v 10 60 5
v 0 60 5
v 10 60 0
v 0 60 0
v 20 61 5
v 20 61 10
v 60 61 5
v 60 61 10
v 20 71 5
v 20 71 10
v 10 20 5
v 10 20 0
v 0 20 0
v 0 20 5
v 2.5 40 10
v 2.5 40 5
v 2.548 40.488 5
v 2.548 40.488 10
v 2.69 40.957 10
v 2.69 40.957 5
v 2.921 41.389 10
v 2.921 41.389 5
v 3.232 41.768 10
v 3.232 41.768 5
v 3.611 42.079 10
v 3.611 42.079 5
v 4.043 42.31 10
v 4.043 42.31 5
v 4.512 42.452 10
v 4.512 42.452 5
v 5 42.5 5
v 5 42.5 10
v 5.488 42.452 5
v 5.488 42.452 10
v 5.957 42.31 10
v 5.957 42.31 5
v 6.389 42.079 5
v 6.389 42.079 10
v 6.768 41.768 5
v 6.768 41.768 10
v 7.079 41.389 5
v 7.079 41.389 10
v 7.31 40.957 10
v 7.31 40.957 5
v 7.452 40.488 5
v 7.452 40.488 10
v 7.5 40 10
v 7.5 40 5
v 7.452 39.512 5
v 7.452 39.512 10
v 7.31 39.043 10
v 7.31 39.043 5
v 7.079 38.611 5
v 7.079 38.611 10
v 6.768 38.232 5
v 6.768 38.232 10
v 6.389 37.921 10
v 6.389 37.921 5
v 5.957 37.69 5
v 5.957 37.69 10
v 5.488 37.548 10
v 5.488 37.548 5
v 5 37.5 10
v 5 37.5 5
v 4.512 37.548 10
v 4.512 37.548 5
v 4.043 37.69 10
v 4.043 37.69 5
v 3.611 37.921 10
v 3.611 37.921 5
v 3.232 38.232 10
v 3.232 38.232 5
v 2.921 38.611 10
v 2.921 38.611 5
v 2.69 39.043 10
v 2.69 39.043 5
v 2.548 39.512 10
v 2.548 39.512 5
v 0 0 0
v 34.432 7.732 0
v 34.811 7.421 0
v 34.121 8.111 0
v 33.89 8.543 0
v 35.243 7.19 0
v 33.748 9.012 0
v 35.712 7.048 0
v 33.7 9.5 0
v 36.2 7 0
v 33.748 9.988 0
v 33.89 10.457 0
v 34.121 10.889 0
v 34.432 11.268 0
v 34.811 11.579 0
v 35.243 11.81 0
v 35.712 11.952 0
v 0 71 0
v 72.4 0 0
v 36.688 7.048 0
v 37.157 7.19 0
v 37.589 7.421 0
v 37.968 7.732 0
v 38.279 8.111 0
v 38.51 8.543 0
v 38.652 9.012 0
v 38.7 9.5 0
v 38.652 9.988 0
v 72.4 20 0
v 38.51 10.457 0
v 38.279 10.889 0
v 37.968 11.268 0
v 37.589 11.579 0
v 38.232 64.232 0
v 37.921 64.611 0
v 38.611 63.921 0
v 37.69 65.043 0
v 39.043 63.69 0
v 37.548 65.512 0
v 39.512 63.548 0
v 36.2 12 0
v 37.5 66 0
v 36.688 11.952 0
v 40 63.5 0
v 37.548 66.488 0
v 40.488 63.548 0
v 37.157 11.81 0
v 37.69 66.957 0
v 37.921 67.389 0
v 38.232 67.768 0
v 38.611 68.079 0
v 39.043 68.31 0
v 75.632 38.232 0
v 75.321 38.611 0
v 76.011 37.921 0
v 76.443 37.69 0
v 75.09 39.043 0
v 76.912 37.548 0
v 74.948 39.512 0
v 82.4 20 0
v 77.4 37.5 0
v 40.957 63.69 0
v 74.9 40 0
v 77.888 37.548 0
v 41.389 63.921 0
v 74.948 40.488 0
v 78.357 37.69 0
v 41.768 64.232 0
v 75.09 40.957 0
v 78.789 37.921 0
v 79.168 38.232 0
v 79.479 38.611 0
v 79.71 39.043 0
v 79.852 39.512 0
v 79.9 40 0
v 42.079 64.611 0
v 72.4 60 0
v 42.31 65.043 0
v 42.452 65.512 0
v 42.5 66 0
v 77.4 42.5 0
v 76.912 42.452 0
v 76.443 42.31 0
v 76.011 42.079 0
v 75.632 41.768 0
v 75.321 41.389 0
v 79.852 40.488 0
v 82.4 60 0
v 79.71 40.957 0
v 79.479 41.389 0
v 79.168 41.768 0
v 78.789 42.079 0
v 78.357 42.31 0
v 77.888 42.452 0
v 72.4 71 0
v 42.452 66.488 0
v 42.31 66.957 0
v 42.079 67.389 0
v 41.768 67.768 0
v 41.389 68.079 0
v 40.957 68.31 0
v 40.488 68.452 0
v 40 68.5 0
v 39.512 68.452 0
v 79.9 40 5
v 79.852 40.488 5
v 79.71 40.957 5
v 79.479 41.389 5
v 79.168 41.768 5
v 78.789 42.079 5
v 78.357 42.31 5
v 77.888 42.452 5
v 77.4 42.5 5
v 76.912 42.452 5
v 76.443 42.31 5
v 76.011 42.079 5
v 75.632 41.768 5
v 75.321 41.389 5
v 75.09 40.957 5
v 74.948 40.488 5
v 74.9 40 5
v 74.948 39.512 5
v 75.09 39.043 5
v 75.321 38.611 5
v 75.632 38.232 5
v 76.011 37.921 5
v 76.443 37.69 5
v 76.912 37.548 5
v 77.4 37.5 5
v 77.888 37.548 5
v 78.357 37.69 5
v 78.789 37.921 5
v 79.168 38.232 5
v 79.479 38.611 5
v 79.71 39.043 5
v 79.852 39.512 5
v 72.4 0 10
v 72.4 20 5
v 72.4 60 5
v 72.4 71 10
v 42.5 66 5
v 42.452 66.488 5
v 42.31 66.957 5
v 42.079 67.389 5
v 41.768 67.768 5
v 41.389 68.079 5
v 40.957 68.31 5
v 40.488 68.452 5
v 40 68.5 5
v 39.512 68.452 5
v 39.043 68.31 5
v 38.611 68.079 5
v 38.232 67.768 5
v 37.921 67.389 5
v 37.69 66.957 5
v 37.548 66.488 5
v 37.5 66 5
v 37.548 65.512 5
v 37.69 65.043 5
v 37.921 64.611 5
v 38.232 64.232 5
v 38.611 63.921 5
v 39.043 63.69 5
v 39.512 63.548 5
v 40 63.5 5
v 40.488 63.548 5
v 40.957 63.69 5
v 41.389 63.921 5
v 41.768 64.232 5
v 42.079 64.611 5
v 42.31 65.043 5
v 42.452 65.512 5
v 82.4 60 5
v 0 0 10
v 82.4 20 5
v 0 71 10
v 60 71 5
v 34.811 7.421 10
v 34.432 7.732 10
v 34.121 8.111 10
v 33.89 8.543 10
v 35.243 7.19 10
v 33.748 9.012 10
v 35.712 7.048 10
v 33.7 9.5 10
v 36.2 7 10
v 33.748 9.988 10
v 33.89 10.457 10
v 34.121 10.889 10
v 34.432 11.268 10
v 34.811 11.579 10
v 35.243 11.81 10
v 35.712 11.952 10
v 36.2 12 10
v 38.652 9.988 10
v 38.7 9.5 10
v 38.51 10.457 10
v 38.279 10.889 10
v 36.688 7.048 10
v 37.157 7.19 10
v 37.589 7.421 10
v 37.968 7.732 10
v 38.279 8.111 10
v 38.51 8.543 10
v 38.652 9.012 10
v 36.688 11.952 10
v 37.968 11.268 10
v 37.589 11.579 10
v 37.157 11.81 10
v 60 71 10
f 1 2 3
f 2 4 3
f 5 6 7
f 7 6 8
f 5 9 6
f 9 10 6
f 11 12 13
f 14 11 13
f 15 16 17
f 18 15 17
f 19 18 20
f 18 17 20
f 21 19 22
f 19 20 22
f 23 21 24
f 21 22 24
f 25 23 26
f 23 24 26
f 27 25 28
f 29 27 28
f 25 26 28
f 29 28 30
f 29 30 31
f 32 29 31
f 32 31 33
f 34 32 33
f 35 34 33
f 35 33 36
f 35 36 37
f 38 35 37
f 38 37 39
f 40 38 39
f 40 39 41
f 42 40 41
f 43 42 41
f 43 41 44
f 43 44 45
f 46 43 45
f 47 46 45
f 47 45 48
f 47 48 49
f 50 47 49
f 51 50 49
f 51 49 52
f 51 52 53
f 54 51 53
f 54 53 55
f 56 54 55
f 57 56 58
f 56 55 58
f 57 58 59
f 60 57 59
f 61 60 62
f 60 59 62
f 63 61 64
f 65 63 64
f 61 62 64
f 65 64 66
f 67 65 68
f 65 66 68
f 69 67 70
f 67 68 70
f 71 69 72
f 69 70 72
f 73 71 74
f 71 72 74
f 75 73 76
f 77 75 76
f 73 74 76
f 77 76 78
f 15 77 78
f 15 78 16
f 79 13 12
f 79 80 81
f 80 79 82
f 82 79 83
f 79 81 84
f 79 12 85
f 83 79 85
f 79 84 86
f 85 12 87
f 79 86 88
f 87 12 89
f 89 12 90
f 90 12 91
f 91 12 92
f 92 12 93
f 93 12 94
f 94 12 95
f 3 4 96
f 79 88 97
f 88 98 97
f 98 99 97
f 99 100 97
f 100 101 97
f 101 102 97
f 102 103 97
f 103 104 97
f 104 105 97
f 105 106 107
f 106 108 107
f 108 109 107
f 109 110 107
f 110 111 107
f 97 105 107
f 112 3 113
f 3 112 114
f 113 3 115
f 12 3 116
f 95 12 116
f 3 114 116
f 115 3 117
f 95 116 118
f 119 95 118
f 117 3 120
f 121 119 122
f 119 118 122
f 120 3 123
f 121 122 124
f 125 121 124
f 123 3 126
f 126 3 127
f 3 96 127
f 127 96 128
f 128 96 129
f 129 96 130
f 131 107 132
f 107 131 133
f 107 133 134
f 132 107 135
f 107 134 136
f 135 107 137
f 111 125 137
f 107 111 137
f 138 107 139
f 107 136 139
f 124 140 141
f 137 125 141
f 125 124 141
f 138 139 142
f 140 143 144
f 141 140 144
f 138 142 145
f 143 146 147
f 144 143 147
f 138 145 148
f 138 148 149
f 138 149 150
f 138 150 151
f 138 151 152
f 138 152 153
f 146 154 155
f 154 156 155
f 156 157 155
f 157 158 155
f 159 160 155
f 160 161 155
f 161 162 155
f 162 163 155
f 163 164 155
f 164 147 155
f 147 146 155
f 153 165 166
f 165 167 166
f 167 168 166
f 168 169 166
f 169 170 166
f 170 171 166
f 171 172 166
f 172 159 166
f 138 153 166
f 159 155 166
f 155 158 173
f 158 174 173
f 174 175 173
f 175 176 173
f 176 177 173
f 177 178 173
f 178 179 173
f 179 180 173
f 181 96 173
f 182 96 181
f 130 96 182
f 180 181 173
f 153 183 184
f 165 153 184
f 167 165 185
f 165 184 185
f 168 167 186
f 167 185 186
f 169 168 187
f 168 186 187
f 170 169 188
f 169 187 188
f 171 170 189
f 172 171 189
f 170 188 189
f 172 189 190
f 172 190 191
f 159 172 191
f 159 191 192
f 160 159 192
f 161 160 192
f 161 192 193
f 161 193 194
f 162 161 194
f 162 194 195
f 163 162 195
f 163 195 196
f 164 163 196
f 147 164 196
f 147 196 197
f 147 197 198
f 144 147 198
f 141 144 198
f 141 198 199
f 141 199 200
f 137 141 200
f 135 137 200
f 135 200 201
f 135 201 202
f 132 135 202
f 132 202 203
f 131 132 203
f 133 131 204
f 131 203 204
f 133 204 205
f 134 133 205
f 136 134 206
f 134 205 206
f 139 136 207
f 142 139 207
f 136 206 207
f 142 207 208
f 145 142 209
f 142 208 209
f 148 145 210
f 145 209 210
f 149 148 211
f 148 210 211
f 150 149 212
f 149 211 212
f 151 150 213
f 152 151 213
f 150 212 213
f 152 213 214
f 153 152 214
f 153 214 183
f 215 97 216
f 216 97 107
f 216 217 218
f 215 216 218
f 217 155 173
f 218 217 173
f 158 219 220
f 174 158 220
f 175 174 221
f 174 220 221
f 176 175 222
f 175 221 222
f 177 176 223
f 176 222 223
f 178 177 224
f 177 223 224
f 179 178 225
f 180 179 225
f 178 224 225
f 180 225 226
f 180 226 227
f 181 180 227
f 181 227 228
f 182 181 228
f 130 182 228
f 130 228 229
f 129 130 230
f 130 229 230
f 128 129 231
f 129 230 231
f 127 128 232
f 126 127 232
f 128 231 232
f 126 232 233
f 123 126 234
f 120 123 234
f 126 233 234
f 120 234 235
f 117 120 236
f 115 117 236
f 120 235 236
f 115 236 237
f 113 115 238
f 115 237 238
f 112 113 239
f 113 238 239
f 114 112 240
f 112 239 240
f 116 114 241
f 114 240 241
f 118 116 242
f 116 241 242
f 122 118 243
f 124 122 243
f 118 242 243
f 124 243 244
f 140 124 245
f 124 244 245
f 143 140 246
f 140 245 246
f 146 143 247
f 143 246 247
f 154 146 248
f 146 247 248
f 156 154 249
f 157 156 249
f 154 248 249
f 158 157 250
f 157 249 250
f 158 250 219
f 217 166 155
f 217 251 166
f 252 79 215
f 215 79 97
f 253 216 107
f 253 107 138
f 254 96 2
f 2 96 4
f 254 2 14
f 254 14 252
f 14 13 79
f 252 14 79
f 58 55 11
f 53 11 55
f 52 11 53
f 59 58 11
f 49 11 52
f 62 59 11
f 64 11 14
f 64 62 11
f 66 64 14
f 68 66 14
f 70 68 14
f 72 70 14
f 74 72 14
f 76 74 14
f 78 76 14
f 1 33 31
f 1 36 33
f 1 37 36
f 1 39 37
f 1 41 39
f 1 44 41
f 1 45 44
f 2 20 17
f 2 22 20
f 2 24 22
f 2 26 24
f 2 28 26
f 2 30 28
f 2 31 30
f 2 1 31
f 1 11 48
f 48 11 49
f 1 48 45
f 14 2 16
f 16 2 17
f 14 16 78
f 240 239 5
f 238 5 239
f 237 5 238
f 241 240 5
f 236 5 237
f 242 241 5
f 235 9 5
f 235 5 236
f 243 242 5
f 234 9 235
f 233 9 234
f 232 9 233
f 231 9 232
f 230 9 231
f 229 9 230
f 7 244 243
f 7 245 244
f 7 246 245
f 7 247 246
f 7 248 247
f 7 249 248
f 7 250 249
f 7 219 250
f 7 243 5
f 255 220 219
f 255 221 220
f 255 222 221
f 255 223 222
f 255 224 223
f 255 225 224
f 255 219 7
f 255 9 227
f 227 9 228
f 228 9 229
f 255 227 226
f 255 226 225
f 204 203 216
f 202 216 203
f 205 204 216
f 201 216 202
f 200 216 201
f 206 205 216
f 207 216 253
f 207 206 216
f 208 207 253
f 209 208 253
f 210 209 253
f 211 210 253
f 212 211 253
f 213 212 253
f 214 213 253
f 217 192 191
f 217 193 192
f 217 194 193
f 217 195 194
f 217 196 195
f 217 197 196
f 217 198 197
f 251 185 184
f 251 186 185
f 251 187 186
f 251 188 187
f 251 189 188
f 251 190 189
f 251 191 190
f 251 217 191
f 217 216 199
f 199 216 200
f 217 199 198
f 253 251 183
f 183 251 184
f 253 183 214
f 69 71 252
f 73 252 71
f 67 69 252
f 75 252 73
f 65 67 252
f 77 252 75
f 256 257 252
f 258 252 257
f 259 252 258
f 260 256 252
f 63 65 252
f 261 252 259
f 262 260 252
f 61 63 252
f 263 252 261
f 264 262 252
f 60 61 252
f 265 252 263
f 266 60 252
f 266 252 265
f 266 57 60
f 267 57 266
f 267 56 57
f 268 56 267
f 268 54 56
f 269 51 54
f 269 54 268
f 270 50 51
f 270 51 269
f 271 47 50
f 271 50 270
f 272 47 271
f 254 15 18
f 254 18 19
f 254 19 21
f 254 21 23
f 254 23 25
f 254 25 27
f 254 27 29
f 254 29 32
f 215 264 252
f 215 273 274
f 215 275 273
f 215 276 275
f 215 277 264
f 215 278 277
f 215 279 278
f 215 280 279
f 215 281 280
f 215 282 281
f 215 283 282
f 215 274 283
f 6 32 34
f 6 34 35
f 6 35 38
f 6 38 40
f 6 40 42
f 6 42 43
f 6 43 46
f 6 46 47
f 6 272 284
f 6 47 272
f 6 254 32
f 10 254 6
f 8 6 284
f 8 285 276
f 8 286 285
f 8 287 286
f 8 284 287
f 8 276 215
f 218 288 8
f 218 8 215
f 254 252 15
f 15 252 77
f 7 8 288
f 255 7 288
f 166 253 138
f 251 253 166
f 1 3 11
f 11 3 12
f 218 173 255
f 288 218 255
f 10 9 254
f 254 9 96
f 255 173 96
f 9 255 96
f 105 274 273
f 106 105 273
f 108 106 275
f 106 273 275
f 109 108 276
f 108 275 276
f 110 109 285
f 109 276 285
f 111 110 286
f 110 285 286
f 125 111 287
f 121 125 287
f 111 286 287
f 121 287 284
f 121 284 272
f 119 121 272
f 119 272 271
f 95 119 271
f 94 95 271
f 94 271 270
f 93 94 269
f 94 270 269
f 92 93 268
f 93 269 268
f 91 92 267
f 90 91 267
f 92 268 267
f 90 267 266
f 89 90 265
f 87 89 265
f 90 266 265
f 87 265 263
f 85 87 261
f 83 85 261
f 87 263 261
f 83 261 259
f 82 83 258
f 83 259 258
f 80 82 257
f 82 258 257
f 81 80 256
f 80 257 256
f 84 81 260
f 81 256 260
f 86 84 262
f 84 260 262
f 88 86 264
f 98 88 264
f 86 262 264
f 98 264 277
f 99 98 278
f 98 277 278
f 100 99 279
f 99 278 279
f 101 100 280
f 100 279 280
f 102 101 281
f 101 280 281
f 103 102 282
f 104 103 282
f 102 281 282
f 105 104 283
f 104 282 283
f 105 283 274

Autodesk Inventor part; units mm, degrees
ref_plane "YZ Plane" through (0, 0, 0) normal (1, 0, 0) x (0, 1, 0)
ref_plane "XZ Plane" through (0, 0, 0) normal (0, 1, 0) x (-1, 0, 0)
ref_plane "XY Plane" through (0, 0, 0) normal (0, 0, 1) x (1, 0, 0)
sketch "Sketch1" plane through (0, 0, 0) normal (0, 0, 1) x (1, 0, 0)
  line L0 (0, 0) -> (72.4, 0)
  line L1 (72.4, 0) -> (72.4, 71)
  line L2 (72.4, 71) -> (0, 71)
  line L3 (0, 71) -> (0, 0)
  dimension "d0" = 72.4
  dimension "d1" = 71
extrude "Extrusion1" add sketch "Sketch1" along normal blind 10
sketch "Sketch2" plane through (0, 0, 10) normal (0, 0, 1) x (1, 0, 0)
  line L0 (72.4, 0) -> (72.4, 71) projected
  line L1 (72.4, 20) -> (82.4, 20)
  line L2 (82.4, 20) -> (82.4, 60)
  line L3 (82.4, 60) -> (72.4, 60)
  line L4 (72.4, 60) -> (72.4, 20)
  line L5 (72.4, 71) -> (0, 71) projected
  circle A0 centre (77.4, 40) radius 2.5
  line L6 (0, 0) -> (72.4, 0) projected
  point P0 (82.4, 40)
  point P1 (77.4, 60)
  dimension "d4" = 10
  dimension "d5" = 40
  dimension "d7" = 5
  dimension "d22" = 20
extrude "Extrusion2" add sketch "Sketch2" against normal blind 10
sketch "Sketch3" plane through (0, 0, 10) normal (0, 0, 1) x (1, 0, 0)
  line L0 (72.4, 60) -> (82.4, 60) projected
  line L1 (72.4, 20) -> (82.4, 20) projected
  line L2 (82.4, 60) -> (72.4, 60)
  line L3 (72.4, 60) -> (72.4, 20)
  line L4 (72.4, 20) -> (82.4, 20)
  line L5 (82.4, 20) -> (82.4, 60)
  point P0 (0, 0)
extrude "Extrusion3" cut sketch "Sketch3" against normal blind 5
sketch "Sketch4" plane through (0, 0, 0) normal (0, 0, -1) x (-1, 0, 0)
  line L0 (0, 71) -> (0, 0) projected
  line L1 (0, 60) -> (-10, 60)
  line L2 (-10, 60) -> (-10, 20)
  line L3 (-10, 20) -> (0, 20)
  line L4 (0, 20) -> (0, 60)
  point P0 (-72.4, 60)
  dimension "d15" = 10
  dimension "d16" = 40
extrude "Extrusion4" cut sketch "Sketch4" against normal blind 5
sketch "Sketch5" plane through (0, 0, 5) normal (0, 0, -1) x (-1, 0, 0)
  circle A0 centre (-5, 40) radius 2.5
  line L0 (0, 60) -> (0, 20) projected
  line L1 (-10, 60) -> (0, 60) projected
  point P0 (0, 0)
  point P1 (0, 40)
  point P2 (-5, 60)
  dimension "d19" = 5
extrude "Extrusion5" cut sketch "Sketch5" against normal through all
sketch "Sketch6" plane through (0, 0, 10) normal (0, 0, 1) x (1, 0, 0)
  line L0 (72.4, 71) -> (0, 71) projected
  line L1 (60, 71) -> (20, 71)
  line L2 (20, 71) -> (20, 61)
  line L3 (20, 61) -> (60, 61)
  line L4 (60, 61) -> (60, 71)
  line L5 (0, 71) -> (0, 0) projected
  dimension "d23" = 40
  dimension "d24" = 10
  dimension "d25" = 20
extrude "Extrusion6" cut sketch "Sketch6" against normal blind 5
sketch "Sketch7" plane through (0, 0, 5) normal (0, 0, 1) x (1, 0, 0)
  circle A0 centre (40, 66) radius 2.5
  line L0 (60, 61) -> (20, 61) projected
  line L1 (20, 61) -> (20, 71) projected
  point P0 (0, 0)
  point P1 (40, 61)
  point P2 (20, 66)
  dimension "d28" = 5
extrude "Extrusion7" cut sketch "Sketch7" against normal through all
sketch "Sketch8" plane through (0, 0, 10) normal (0, 0, 1) x (1, 0, 0)
  circle A0 centre (36.2, 9.5) radius 2.5
  line L0 (0, 0) -> (72.4, 0) projected
  point P0 (36.2, 0)
  dimension "d31" = 5
  dimension "d32" = 9.5
extrude "Extrusion8" cut sketch "Sketch8" against normal through all
properties part number "SP002" material "ABS Plastic"
